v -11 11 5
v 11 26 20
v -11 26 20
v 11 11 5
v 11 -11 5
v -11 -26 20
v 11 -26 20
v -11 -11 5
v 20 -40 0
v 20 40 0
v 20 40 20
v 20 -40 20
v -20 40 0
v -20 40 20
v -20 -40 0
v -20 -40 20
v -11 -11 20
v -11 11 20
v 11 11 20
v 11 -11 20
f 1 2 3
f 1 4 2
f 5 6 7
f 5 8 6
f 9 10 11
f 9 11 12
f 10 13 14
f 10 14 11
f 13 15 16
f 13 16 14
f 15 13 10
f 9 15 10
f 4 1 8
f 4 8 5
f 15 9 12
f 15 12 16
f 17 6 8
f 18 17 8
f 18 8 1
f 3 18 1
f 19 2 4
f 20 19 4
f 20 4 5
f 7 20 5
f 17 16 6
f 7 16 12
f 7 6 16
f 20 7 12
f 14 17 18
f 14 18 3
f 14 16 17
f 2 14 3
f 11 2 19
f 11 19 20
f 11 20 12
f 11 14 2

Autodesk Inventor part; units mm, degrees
ref_plane "YZ Plane" through (0, 0, 0) normal (1, 0, 0) x (0, 1, 0)
ref_plane "XZ Plane" through (0, 0, 0) normal (0, 1, 0) x (-1, 0, 0)
ref_plane "XY Plane" through (0, 0, 0) normal (0, 0, 1) x (1, 0, 0)
sketch "Sketch1" plane through (0, 0, 0) normal (0, 0, 1) x (1, 0, 0)
  line L0 (-20, 40) -> (20, 40)
  line L1 (20, 40) -> (20, -40)
  line L2 (20, -40) -> (-20, -40)
  line L3 (-20, -40) -> (-20, 40)
  line L4 (0, 0) -> (10, 0) construction
  line L5 (0, 0) -> (0, -10) construction
  dimension "d0" = 40
  dimension "d1" = 80
  dimension "d2" = 10
  dimension "d3" = 10
extrude "Extrusion1" add sketch "Sketch1" along normal blind 20
sketch "Sketch2" plane through (0, 0, 20) normal (0, 0, 1) x (1, 0, 0)
  line L0 (0, 0) -> (0, 10) construction
  line L1 (0, 0) -> (10, 0) construction
  line L2 (-11, 11) -> (11, 11)
  line L3 (11, 11) -> (11, -11)
  line L4 (11, -11) -> (-11, -11)
  line L5 (-11, -11) -> (-11, 11)
  dimension "d6" = 10
  dimension "d7" = 10
  dimension "d8" = 22
  dimension "d9" = 22
extrude "Extrusion2" cut sketch "Sketch2" against normal blind 15
chamfer "Chamfer1" distance 15 angle 45 1 edges at (0, -11, 20)
chamfer "Chamfer2" distance 15 angle 45 1 edges at (0, 11, 20)
properties part number "rod_socket"
